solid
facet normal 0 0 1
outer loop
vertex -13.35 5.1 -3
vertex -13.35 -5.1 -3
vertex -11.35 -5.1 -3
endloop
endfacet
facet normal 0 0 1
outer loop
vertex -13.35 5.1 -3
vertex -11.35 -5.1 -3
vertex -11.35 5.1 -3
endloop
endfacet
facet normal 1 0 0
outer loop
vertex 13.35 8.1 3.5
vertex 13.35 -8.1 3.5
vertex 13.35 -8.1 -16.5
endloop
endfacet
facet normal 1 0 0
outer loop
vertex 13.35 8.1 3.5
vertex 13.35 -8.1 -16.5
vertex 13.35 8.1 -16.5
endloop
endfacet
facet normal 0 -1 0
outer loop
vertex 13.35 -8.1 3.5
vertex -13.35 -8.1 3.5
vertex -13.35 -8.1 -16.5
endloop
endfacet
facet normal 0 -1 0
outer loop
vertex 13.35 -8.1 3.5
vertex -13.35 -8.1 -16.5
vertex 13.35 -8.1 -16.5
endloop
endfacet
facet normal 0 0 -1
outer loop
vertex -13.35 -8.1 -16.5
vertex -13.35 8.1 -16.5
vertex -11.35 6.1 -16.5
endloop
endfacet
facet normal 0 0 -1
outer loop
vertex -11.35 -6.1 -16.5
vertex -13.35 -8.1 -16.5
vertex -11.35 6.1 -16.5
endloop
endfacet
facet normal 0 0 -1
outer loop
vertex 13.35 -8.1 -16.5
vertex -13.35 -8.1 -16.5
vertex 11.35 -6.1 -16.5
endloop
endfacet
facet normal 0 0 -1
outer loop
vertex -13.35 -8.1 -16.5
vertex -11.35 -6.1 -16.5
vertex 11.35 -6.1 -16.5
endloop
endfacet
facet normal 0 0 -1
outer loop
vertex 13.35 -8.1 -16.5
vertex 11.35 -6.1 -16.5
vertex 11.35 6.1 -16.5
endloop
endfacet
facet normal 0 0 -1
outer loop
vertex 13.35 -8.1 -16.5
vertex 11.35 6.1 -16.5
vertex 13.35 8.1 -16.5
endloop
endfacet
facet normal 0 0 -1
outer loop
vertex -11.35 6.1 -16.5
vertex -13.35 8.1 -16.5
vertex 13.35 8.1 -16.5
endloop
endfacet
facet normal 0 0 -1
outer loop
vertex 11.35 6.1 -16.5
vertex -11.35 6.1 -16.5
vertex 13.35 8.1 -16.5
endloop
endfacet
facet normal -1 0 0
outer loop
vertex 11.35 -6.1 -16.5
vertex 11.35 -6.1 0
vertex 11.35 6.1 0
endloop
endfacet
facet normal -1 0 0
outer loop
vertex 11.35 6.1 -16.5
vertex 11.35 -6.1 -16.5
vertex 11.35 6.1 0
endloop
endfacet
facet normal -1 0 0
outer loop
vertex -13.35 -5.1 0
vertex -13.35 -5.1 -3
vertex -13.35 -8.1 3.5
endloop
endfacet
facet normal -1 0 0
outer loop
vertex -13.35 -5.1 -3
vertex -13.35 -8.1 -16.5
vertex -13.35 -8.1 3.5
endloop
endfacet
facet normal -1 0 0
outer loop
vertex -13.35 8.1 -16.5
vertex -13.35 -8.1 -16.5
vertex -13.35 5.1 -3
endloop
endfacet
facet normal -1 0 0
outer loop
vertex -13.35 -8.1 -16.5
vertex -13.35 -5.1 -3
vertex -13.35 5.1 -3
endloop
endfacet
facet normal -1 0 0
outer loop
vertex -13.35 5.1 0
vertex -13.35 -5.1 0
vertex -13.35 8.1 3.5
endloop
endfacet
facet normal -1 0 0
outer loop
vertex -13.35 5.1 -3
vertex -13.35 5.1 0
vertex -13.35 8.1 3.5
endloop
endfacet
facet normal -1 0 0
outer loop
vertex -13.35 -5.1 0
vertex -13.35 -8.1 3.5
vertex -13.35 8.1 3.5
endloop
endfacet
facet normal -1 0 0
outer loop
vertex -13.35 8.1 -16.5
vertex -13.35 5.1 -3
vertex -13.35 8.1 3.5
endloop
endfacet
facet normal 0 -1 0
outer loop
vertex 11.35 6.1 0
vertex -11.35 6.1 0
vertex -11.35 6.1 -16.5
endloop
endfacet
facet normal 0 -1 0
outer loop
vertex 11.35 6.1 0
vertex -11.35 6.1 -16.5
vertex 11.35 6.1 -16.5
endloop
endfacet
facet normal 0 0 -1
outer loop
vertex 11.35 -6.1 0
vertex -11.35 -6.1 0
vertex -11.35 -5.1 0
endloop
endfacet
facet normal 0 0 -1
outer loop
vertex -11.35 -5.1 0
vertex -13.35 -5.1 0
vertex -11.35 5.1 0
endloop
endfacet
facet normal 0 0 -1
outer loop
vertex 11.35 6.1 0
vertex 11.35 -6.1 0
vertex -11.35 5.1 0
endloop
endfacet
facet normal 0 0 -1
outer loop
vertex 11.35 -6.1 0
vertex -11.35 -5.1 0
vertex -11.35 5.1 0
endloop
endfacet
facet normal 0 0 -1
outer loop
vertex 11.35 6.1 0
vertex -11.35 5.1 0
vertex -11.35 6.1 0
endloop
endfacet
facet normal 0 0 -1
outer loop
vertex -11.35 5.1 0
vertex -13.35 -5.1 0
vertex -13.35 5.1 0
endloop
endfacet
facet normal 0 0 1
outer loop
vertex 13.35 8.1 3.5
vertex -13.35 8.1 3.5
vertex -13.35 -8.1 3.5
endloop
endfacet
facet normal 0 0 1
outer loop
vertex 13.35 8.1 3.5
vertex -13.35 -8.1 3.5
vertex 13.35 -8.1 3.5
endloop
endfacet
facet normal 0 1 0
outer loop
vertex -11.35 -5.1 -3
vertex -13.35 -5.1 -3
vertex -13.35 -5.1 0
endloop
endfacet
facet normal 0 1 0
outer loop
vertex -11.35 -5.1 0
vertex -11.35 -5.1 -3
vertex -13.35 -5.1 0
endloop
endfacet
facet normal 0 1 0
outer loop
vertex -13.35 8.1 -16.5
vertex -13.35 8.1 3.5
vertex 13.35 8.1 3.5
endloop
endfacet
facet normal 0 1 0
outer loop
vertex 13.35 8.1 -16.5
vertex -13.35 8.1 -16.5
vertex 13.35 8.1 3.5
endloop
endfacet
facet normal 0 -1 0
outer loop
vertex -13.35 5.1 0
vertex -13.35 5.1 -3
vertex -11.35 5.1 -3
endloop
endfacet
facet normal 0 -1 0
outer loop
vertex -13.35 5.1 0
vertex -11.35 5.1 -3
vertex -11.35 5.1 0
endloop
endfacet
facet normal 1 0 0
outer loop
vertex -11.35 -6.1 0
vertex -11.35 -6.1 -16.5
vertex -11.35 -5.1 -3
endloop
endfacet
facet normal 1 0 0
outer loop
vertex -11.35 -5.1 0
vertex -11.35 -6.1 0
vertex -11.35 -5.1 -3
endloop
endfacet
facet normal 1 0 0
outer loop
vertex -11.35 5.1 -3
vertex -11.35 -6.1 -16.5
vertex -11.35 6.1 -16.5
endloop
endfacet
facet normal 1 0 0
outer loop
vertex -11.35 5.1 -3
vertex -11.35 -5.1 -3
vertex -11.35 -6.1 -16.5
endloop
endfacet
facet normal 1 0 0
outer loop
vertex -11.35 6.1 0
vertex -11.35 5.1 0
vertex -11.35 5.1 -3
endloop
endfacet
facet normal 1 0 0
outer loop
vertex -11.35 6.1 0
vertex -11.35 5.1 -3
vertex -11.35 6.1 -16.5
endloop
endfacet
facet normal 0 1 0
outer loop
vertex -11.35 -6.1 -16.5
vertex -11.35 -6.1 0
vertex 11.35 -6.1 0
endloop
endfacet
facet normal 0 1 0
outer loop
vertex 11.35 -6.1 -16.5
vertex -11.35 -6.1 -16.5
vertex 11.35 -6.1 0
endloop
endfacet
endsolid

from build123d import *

# Parameters (mm, degrees)
SKETCH1_W           = 22.7
SKETCH1_H           = 12.2
BOSS_EXTRUDE1_DEPTH = 3.5
SKETCH2_W           = 26.7
SKETCH2_H           = 16.2
SKETCH2_W_2         = 22.7
SKETCH2_H_2         = 12.2
BOSS_EXTRUDE2_DEPTH = 20
SKETCH3_W           = 3
SKETCH3_H           = 10.2
CUT_EXTRUDE1_DEPTH  = 2


with BuildPart() as part:
    # Sketch1 → Boss-Extrude1 (new body)
    with BuildSketch(Plane.XY):
        Rectangle(SKETCH1_W, SKETCH1_H)
    extrude(amount=BOSS_EXTRUDE1_DEPTH)

    # Sketch2 → Boss-Extrude2 (add)
    with BuildSketch(Plane.XY.offset(3.5)):
        Rectangle(SKETCH2_W, SKETCH2_H)
        Rectangle(SKETCH2_W_2, SKETCH2_H_2, mode=Mode.SUBTRACT)
    extrude(amount=-BOSS_EXTRUDE2_DEPTH)

    # Sketch3 → Cut-Extrude1 (cut)
    with BuildSketch(Plane.ZY.offset(13.35)):
        with Locations((-1.5, 0)):
            Rectangle(SKETCH3_W, SKETCH3_H)
    extrude(amount=-CUT_EXTRUDE1_DEPTH, mode=Mode.SUBTRACT)


solid = part.part
